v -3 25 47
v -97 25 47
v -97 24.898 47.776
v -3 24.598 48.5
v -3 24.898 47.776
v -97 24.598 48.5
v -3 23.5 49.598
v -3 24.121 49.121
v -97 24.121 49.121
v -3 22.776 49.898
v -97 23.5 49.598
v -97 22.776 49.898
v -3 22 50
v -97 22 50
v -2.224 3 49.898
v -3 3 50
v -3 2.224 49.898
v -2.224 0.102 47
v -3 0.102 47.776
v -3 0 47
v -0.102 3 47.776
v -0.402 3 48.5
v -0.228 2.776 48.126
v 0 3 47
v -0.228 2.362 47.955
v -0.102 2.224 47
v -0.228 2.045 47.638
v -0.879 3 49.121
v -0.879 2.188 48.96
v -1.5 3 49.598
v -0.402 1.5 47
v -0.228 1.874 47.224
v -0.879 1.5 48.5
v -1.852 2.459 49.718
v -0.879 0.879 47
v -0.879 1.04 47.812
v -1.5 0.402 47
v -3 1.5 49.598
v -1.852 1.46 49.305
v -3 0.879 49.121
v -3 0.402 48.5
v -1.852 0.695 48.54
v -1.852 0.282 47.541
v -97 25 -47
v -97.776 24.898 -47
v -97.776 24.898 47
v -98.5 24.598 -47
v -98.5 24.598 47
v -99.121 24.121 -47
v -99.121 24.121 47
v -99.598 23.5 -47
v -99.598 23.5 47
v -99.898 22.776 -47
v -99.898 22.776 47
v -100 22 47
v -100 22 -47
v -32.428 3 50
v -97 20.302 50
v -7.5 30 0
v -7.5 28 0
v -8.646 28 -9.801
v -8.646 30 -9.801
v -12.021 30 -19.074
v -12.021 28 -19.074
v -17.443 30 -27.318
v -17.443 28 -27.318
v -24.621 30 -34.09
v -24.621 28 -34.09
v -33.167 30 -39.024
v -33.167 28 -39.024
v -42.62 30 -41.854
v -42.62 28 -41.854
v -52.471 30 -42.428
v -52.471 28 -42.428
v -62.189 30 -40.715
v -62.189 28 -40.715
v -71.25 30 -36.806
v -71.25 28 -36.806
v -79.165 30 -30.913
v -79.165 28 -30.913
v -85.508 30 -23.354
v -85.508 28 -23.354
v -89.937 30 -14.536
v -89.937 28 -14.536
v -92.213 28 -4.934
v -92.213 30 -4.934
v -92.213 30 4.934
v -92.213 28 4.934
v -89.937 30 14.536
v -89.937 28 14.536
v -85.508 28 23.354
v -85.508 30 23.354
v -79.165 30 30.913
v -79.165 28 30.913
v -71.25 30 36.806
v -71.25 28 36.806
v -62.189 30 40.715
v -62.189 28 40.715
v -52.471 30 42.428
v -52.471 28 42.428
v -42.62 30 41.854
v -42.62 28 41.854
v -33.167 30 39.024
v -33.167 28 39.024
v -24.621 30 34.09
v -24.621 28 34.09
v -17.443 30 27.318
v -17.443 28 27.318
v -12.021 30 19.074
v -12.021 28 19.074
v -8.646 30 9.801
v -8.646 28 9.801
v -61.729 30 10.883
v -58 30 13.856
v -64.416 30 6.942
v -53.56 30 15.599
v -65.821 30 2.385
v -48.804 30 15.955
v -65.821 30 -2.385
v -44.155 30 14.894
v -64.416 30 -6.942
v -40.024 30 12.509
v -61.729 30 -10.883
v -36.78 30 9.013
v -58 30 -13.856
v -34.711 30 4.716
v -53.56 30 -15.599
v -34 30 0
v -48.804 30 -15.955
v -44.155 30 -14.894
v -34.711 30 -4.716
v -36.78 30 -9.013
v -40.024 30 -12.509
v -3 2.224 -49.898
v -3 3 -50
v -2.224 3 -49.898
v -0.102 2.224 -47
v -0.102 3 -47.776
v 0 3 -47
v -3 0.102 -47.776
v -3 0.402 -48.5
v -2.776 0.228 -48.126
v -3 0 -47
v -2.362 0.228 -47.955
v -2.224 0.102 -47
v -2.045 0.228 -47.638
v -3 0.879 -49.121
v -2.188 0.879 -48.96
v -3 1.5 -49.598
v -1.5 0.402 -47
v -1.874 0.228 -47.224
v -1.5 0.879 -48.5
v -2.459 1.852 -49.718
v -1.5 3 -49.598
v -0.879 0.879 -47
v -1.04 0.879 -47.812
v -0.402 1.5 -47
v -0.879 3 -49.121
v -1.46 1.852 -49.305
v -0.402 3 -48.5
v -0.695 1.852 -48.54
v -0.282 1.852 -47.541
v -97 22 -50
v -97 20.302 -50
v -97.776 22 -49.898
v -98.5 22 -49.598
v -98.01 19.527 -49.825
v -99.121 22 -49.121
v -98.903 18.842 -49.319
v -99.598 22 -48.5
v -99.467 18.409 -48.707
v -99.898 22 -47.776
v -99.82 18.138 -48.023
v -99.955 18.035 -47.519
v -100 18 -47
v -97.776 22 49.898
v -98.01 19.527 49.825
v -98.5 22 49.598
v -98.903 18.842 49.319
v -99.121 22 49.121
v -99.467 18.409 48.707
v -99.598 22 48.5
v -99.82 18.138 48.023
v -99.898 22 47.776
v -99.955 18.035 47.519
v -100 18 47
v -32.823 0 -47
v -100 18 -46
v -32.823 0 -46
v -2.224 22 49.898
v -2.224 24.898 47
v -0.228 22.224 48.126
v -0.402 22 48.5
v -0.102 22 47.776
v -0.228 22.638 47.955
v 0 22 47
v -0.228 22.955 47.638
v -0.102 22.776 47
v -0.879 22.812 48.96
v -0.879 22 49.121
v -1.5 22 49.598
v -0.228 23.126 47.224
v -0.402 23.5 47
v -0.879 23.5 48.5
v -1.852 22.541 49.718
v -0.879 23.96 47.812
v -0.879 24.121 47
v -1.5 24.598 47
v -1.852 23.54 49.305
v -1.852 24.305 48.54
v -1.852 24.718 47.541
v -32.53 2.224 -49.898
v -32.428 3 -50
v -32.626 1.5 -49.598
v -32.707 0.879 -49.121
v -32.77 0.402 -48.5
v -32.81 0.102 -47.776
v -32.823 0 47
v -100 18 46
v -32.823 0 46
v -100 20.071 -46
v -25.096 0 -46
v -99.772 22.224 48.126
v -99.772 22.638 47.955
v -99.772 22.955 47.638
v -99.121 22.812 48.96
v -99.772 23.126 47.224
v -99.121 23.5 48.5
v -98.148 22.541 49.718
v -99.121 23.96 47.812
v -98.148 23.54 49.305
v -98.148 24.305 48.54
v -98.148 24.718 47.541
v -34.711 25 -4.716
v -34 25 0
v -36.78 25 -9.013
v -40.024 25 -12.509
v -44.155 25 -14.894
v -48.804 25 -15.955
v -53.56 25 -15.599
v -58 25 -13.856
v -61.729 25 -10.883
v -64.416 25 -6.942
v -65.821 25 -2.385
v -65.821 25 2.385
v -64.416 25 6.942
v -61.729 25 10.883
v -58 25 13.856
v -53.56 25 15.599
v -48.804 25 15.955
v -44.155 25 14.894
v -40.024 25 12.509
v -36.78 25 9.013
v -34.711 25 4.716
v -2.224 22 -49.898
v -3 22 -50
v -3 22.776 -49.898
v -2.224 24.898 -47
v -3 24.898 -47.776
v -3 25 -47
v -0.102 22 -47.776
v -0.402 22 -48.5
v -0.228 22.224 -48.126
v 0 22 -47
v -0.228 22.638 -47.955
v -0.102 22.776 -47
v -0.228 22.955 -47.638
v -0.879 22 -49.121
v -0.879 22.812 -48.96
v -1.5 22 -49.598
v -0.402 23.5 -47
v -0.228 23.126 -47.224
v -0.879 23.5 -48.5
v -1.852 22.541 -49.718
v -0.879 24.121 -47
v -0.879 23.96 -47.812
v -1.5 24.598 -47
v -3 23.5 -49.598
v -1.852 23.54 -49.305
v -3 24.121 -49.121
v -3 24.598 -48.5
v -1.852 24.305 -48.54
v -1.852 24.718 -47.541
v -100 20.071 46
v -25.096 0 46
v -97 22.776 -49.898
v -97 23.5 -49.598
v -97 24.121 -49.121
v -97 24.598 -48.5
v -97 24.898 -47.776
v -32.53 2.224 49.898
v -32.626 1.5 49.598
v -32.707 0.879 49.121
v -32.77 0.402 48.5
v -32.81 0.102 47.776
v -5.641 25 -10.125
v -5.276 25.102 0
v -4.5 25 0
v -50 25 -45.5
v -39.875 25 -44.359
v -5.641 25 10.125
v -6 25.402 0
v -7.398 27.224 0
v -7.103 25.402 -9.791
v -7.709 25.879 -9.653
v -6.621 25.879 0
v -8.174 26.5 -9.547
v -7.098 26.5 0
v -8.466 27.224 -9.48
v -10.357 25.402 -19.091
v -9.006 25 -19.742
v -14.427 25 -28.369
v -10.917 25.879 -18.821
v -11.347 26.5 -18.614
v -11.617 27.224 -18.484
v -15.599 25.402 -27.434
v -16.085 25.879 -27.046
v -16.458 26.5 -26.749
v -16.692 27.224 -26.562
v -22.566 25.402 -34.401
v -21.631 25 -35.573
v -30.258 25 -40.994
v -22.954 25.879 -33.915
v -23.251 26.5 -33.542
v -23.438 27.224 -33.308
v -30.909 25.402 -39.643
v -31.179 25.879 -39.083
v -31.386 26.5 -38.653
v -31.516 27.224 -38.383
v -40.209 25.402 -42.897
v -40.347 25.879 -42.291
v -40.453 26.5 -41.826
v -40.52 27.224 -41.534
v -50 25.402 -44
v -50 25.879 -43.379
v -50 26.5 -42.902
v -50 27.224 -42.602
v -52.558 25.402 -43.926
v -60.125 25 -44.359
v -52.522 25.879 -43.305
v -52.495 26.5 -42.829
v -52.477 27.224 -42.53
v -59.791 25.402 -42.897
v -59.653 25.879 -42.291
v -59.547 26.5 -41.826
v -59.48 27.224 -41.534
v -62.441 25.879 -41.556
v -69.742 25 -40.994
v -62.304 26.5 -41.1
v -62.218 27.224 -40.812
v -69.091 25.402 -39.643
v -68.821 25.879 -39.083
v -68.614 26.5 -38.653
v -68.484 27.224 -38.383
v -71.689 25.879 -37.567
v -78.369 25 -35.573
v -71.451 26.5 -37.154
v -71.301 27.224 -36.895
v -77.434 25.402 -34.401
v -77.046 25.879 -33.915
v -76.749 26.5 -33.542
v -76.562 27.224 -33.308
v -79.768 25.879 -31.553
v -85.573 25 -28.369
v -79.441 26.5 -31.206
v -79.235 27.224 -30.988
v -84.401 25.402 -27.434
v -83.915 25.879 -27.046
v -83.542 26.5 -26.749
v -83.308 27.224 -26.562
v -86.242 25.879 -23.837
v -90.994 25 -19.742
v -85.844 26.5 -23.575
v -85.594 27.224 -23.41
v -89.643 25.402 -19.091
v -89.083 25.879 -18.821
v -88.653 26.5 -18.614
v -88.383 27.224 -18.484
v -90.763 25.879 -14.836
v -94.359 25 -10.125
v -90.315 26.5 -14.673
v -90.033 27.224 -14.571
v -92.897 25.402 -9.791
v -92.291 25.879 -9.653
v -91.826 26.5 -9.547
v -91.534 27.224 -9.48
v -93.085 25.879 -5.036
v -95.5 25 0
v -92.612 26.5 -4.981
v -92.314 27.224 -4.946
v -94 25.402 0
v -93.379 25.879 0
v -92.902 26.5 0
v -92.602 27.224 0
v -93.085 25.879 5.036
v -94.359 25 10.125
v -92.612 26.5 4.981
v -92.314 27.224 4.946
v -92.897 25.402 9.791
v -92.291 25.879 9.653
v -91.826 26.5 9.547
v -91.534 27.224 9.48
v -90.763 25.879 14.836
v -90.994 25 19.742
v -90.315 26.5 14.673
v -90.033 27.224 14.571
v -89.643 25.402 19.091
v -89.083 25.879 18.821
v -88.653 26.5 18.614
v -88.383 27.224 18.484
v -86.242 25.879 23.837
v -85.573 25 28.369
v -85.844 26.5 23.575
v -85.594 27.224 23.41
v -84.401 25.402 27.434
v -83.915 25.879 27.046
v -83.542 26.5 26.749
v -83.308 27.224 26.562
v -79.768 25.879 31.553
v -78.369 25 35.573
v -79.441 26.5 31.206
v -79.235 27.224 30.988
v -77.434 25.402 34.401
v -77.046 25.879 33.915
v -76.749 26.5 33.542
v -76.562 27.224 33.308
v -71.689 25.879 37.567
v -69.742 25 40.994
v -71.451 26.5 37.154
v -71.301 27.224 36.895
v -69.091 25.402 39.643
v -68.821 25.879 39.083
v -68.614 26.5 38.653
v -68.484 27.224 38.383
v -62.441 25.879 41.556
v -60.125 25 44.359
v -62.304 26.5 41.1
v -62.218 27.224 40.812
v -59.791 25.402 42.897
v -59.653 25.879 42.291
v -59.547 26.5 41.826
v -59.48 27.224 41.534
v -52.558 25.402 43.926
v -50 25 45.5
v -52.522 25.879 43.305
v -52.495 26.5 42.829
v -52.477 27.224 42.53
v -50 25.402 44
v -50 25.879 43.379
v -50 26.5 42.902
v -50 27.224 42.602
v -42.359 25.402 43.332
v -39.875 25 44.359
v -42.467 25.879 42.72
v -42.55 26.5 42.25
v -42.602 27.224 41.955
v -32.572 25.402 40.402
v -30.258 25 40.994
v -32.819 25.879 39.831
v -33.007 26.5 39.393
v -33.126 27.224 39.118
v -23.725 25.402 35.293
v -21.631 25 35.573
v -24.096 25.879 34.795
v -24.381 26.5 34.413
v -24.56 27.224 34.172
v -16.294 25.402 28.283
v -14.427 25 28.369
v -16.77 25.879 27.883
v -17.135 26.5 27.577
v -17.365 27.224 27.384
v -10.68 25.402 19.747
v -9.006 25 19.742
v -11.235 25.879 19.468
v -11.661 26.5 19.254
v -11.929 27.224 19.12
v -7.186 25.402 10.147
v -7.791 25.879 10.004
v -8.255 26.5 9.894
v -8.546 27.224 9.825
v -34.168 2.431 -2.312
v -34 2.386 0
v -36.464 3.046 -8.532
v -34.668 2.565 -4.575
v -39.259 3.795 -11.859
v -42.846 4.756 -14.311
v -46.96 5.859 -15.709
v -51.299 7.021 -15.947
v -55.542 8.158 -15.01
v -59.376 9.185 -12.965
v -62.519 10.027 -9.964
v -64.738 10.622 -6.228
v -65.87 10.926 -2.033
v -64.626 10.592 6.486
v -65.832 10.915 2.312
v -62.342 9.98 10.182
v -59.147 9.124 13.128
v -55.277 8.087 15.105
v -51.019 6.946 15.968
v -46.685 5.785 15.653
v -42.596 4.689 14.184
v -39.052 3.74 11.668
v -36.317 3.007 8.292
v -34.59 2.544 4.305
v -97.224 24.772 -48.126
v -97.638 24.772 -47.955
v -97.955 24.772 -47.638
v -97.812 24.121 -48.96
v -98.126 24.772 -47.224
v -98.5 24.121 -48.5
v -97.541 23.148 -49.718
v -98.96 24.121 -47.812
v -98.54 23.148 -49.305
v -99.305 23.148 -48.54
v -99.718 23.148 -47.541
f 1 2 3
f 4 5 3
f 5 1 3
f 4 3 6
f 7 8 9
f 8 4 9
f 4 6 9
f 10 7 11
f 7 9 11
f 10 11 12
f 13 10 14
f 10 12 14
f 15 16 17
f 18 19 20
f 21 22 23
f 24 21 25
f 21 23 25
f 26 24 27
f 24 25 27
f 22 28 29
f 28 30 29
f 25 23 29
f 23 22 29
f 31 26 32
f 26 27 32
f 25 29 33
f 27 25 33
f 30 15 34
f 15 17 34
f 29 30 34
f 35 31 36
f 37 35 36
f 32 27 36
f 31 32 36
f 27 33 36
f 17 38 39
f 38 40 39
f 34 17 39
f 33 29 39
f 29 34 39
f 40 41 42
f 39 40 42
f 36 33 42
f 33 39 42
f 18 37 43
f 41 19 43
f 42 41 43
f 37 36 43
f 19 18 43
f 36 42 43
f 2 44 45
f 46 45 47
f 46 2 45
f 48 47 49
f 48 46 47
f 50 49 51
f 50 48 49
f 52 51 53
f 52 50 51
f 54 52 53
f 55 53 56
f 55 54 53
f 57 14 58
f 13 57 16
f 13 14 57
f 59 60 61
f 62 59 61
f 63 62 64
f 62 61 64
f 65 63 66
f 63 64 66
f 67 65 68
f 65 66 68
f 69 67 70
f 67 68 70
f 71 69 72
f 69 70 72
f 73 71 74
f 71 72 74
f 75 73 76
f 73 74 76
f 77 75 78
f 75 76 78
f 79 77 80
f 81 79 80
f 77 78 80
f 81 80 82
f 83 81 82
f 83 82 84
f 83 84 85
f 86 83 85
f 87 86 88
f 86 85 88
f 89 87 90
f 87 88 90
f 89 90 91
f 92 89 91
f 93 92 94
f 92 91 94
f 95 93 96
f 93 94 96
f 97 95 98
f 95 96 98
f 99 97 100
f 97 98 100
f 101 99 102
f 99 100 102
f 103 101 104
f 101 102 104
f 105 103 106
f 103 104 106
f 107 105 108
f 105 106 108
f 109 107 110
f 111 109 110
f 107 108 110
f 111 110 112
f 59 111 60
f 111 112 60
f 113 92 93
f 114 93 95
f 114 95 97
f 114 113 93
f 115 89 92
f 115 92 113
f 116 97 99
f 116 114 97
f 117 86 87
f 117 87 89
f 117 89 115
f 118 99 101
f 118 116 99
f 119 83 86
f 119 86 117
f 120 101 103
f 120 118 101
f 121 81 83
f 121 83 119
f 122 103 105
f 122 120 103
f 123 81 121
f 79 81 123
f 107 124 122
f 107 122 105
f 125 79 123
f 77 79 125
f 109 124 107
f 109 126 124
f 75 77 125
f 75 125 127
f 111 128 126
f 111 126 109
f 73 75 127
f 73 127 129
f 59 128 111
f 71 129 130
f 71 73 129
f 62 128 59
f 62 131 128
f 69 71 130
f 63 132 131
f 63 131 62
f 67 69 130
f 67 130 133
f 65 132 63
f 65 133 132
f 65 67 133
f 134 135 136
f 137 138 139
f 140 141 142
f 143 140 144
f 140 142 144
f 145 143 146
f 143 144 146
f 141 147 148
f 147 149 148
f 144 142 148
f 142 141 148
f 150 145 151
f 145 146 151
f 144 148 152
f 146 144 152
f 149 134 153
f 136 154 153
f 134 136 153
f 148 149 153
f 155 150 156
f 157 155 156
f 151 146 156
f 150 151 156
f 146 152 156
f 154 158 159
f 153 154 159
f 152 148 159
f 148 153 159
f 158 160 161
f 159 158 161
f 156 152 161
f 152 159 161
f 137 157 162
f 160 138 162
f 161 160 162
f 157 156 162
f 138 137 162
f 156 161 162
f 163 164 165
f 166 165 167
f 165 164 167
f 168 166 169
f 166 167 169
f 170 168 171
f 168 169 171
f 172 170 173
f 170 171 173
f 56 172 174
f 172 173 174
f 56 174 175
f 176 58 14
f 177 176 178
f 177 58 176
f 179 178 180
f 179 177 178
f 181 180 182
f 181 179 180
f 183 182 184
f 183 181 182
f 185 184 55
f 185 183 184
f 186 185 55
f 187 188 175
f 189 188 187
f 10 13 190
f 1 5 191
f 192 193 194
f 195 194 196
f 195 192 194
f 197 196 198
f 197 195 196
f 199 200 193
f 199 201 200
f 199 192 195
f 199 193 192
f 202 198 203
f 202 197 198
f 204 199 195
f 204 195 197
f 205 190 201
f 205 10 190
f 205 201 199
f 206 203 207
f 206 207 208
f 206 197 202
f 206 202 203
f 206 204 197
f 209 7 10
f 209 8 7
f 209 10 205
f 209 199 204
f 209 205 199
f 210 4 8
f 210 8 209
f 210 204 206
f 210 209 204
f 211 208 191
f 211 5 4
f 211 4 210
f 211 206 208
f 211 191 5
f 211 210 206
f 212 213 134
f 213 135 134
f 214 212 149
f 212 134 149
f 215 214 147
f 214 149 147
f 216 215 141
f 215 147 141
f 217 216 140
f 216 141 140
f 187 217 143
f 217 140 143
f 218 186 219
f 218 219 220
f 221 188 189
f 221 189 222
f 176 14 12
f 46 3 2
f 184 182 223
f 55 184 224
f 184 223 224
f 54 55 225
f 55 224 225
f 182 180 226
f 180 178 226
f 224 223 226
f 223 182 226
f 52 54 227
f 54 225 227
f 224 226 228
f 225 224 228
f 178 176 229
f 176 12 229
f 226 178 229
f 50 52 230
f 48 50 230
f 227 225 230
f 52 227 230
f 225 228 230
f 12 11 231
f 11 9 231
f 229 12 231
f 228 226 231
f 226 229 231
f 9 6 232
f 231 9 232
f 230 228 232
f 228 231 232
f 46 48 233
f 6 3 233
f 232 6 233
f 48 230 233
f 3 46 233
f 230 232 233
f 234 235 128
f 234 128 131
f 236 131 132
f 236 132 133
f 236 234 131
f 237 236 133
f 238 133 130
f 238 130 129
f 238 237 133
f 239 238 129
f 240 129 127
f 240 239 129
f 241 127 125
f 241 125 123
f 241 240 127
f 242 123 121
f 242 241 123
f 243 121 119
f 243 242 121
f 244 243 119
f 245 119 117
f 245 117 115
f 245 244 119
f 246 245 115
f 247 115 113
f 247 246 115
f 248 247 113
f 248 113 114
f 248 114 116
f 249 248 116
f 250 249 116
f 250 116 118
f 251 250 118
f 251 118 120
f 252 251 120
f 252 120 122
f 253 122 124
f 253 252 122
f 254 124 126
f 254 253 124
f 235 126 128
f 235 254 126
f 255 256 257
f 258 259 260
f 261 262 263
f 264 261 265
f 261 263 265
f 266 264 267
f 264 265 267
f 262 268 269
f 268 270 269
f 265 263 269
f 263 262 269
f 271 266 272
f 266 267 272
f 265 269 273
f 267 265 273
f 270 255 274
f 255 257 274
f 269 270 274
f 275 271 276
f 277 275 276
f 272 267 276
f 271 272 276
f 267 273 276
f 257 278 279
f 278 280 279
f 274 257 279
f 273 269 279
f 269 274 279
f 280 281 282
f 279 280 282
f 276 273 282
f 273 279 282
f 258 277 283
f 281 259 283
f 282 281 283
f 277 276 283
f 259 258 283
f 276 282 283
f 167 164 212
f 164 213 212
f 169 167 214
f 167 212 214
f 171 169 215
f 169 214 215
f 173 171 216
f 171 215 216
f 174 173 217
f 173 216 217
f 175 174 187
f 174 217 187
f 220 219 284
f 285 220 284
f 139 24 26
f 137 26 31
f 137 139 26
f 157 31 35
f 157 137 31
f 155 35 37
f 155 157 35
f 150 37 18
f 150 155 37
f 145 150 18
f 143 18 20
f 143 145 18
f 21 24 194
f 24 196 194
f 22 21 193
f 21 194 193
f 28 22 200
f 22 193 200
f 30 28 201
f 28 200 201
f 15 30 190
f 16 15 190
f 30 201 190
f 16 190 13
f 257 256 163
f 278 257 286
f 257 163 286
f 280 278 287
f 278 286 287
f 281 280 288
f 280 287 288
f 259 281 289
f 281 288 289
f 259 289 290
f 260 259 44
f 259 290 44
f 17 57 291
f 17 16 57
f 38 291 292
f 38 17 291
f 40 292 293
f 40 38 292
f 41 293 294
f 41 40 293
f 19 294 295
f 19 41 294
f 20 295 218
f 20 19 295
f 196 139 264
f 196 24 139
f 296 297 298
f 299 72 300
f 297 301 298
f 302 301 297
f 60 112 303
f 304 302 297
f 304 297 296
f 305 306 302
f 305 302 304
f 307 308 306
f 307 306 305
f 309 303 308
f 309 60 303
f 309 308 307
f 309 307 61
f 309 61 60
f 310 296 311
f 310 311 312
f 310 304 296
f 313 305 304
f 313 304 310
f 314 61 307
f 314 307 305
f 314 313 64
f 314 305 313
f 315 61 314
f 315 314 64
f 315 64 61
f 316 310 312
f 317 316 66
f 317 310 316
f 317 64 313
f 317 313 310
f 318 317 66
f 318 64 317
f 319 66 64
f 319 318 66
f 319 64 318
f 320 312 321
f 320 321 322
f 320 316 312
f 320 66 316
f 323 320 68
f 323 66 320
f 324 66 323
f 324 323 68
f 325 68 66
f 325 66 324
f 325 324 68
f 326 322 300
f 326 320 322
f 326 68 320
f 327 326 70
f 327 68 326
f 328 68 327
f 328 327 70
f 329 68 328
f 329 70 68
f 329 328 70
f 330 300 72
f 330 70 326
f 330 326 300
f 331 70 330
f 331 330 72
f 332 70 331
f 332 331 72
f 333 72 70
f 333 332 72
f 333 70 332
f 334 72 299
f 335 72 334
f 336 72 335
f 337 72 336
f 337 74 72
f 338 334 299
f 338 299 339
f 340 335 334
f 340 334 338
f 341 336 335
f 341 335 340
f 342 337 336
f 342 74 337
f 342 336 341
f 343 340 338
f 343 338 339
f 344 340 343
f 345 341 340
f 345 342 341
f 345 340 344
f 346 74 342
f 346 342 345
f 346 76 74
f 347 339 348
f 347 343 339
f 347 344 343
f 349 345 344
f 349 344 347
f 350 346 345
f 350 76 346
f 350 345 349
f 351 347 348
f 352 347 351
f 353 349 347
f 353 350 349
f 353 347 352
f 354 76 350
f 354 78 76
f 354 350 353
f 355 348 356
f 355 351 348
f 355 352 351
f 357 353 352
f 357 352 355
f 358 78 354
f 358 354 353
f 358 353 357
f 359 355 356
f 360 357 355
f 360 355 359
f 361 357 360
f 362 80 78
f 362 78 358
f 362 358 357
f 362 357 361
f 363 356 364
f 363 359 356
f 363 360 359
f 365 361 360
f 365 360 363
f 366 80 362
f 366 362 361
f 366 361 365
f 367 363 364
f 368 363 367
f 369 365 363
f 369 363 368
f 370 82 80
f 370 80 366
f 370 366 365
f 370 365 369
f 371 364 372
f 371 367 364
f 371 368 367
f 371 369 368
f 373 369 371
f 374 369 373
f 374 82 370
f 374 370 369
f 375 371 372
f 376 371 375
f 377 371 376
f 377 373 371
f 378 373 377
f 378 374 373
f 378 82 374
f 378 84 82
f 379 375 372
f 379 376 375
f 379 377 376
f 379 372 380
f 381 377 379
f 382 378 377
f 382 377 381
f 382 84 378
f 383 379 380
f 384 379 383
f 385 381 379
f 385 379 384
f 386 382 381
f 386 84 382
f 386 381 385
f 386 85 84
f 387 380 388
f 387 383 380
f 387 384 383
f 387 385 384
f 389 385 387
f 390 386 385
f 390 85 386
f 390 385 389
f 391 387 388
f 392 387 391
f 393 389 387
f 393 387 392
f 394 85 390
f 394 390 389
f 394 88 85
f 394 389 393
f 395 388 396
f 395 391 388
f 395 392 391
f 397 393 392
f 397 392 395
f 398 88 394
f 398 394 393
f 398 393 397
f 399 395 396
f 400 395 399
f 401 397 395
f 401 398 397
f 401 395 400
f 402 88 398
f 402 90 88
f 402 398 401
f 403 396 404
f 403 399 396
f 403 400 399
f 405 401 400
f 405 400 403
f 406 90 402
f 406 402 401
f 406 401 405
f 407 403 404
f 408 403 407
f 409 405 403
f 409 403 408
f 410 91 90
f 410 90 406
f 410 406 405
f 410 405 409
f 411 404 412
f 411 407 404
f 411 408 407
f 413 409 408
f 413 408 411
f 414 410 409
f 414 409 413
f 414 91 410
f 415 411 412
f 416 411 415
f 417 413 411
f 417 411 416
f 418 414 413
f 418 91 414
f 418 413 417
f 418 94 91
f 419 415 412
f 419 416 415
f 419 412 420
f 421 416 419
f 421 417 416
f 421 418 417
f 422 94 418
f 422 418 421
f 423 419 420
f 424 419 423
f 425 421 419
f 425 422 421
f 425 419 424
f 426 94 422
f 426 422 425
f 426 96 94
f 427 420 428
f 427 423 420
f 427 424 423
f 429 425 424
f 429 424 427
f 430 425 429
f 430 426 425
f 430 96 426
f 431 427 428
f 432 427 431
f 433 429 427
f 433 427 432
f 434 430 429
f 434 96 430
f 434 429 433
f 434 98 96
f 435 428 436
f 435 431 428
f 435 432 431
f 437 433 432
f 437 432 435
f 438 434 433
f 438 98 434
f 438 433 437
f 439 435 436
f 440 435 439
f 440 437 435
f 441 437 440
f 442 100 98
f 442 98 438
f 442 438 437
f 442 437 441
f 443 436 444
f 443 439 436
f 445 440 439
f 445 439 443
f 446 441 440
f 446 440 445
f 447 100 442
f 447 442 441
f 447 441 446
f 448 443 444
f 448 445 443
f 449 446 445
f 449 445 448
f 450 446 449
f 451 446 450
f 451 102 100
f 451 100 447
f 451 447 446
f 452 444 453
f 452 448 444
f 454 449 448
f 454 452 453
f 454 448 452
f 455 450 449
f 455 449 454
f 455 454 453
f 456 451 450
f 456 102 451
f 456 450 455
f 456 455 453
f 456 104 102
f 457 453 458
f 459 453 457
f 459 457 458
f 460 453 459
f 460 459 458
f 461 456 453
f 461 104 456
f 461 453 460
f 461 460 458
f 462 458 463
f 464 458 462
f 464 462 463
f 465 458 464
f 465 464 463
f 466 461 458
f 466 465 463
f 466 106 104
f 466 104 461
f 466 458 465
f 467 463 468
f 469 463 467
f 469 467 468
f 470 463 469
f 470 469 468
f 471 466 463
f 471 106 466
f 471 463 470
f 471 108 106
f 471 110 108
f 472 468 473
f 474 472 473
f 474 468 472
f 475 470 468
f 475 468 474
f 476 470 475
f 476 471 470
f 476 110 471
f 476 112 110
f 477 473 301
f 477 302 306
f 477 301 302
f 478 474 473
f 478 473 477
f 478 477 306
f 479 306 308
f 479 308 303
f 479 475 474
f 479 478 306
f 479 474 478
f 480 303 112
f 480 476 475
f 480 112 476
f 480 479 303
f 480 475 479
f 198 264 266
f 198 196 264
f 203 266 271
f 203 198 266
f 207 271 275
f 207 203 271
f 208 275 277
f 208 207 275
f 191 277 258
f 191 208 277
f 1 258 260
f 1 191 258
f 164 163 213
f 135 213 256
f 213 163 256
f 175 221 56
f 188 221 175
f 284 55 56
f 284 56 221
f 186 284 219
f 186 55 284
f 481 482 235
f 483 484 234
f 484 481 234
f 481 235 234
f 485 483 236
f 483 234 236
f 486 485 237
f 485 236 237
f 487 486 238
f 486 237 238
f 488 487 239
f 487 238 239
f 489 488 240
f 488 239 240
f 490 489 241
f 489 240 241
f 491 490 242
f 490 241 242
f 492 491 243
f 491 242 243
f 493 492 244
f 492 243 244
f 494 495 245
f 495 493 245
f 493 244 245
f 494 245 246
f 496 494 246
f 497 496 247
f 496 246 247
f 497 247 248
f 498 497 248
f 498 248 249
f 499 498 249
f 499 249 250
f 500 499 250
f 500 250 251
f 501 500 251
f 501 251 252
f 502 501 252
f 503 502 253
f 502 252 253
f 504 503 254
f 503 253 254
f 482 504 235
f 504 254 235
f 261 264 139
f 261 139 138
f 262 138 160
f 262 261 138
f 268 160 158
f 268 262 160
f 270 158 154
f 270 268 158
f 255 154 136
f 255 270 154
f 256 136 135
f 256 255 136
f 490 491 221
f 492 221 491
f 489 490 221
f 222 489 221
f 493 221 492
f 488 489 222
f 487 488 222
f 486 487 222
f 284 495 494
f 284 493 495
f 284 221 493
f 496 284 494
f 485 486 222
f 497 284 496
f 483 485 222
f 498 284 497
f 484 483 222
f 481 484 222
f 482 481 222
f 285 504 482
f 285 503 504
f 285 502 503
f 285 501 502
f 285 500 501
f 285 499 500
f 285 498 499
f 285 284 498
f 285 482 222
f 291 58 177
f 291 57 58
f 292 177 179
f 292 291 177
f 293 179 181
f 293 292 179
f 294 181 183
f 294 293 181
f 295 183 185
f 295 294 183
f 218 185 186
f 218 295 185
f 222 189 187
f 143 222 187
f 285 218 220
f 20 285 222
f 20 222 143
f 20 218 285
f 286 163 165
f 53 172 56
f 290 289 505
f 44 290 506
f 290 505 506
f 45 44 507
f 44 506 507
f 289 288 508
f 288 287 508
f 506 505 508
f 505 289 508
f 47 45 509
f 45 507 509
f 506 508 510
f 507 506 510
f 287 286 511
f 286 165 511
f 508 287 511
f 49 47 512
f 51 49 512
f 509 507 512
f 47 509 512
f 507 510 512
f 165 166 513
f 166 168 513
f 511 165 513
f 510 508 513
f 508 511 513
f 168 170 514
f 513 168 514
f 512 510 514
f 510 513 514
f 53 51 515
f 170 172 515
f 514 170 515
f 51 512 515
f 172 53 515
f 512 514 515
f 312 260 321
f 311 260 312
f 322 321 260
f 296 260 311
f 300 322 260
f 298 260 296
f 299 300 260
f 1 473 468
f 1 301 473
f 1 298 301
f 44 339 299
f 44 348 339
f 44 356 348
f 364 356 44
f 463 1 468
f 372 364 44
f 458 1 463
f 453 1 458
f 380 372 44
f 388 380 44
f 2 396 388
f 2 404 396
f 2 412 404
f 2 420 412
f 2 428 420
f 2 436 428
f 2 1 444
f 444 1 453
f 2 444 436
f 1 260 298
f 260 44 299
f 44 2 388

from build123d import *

# Parameters (mm, degrees)
BOSS_EXTRUDE1_DEPTH = 50
SKETCH3_R           = 42.5
SKETCH3_R_2         = 16
BOSS_EXTRUDE2_DEPTH = 5
SKETCH4_R           = 16
CUT_EXTRUDE1_DEPTH  = 26
SKETCH6_W           = 100.044775272
SKETCH6_H           = 92
CUT_EXTRUDE3_DEPTH  = 2
FILLET1_R           = 3


with BuildPart() as part:
    # Sketch2 → Boss-Extrude1 (new body, symmetric)
    with BuildSketch(Plane.XY):
        Polygon((0, 0), (0, 25), (-100, 25), (-100, 18), (-32.823085464, 0), align=None)
    extrude(amount=BOSS_EXTRUDE1_DEPTH, both=True)

    # Sketch3 → Boss-Extrude2 (add)
    with BuildSketch(Plane(origin=(0, 25, 0), x_dir=(1, 0, 0), z_dir=(0, 1, 0))):
        with Locations((-50, 0)):
            Circle(SKETCH3_R)
        with Locations((-50, 0)):
            Circle(SKETCH3_R_2, mode=Mode.SUBTRACT)
    extrude(amount=BOSS_EXTRUDE2_DEPTH)

    # Sketch4 → Cut-Extrude1 (cut, through all)
    with BuildSketch(Plane(origin=(0, 25, 0), x_dir=(1, 0, 0), z_dir=(0, 1, 0))):
        with Locations((-50, 0)):
            Circle(SKETCH4_R)
    extrude(amount=-CUT_EXTRUDE1_DEPTH, mode=Mode.SUBTRACT)

    # Sketch6 → Cut-Extrude3 (cut)
    with BuildSketch(Plane(origin=(-2.198729811, -8.205771366, 0), x_dir=(0.965925826, -0.258819045, 0), z_dir=(-0.258819045, -0.965925826, 0))):
        with Locations((-62.936330428, 0)):
            Rectangle(SKETCH6_W, SKETCH6_H)
    extrude(amount=-CUT_EXTRUDE3_DEPTH, mode=Mode.SUBTRACT)

    # Fillet1
    fillet1_edges = [part.edges().sort_by_distance(p)[0] for p in [
        (-50, 25, 50),
        (-100, 21.5, 50),
        (-92.5, 25, 0),
        (-66.411542732, 9, 50),
        (-16.411542732, 0, 50),
        (-66.411542732, 9, -50),
        (-100, 21.5, -50),
        (-50, 25, -50),
        (0, 12.5, -50),
        (-16.411542732, 0, -50),
        (0, 12.5, 50),
        (-100, 25, 0),
        (0, 25, 0),
        (0, 0, 0),
    ]]
    fillet(fillet1_edges, radius=FILLET1_R)


solid = part.part
